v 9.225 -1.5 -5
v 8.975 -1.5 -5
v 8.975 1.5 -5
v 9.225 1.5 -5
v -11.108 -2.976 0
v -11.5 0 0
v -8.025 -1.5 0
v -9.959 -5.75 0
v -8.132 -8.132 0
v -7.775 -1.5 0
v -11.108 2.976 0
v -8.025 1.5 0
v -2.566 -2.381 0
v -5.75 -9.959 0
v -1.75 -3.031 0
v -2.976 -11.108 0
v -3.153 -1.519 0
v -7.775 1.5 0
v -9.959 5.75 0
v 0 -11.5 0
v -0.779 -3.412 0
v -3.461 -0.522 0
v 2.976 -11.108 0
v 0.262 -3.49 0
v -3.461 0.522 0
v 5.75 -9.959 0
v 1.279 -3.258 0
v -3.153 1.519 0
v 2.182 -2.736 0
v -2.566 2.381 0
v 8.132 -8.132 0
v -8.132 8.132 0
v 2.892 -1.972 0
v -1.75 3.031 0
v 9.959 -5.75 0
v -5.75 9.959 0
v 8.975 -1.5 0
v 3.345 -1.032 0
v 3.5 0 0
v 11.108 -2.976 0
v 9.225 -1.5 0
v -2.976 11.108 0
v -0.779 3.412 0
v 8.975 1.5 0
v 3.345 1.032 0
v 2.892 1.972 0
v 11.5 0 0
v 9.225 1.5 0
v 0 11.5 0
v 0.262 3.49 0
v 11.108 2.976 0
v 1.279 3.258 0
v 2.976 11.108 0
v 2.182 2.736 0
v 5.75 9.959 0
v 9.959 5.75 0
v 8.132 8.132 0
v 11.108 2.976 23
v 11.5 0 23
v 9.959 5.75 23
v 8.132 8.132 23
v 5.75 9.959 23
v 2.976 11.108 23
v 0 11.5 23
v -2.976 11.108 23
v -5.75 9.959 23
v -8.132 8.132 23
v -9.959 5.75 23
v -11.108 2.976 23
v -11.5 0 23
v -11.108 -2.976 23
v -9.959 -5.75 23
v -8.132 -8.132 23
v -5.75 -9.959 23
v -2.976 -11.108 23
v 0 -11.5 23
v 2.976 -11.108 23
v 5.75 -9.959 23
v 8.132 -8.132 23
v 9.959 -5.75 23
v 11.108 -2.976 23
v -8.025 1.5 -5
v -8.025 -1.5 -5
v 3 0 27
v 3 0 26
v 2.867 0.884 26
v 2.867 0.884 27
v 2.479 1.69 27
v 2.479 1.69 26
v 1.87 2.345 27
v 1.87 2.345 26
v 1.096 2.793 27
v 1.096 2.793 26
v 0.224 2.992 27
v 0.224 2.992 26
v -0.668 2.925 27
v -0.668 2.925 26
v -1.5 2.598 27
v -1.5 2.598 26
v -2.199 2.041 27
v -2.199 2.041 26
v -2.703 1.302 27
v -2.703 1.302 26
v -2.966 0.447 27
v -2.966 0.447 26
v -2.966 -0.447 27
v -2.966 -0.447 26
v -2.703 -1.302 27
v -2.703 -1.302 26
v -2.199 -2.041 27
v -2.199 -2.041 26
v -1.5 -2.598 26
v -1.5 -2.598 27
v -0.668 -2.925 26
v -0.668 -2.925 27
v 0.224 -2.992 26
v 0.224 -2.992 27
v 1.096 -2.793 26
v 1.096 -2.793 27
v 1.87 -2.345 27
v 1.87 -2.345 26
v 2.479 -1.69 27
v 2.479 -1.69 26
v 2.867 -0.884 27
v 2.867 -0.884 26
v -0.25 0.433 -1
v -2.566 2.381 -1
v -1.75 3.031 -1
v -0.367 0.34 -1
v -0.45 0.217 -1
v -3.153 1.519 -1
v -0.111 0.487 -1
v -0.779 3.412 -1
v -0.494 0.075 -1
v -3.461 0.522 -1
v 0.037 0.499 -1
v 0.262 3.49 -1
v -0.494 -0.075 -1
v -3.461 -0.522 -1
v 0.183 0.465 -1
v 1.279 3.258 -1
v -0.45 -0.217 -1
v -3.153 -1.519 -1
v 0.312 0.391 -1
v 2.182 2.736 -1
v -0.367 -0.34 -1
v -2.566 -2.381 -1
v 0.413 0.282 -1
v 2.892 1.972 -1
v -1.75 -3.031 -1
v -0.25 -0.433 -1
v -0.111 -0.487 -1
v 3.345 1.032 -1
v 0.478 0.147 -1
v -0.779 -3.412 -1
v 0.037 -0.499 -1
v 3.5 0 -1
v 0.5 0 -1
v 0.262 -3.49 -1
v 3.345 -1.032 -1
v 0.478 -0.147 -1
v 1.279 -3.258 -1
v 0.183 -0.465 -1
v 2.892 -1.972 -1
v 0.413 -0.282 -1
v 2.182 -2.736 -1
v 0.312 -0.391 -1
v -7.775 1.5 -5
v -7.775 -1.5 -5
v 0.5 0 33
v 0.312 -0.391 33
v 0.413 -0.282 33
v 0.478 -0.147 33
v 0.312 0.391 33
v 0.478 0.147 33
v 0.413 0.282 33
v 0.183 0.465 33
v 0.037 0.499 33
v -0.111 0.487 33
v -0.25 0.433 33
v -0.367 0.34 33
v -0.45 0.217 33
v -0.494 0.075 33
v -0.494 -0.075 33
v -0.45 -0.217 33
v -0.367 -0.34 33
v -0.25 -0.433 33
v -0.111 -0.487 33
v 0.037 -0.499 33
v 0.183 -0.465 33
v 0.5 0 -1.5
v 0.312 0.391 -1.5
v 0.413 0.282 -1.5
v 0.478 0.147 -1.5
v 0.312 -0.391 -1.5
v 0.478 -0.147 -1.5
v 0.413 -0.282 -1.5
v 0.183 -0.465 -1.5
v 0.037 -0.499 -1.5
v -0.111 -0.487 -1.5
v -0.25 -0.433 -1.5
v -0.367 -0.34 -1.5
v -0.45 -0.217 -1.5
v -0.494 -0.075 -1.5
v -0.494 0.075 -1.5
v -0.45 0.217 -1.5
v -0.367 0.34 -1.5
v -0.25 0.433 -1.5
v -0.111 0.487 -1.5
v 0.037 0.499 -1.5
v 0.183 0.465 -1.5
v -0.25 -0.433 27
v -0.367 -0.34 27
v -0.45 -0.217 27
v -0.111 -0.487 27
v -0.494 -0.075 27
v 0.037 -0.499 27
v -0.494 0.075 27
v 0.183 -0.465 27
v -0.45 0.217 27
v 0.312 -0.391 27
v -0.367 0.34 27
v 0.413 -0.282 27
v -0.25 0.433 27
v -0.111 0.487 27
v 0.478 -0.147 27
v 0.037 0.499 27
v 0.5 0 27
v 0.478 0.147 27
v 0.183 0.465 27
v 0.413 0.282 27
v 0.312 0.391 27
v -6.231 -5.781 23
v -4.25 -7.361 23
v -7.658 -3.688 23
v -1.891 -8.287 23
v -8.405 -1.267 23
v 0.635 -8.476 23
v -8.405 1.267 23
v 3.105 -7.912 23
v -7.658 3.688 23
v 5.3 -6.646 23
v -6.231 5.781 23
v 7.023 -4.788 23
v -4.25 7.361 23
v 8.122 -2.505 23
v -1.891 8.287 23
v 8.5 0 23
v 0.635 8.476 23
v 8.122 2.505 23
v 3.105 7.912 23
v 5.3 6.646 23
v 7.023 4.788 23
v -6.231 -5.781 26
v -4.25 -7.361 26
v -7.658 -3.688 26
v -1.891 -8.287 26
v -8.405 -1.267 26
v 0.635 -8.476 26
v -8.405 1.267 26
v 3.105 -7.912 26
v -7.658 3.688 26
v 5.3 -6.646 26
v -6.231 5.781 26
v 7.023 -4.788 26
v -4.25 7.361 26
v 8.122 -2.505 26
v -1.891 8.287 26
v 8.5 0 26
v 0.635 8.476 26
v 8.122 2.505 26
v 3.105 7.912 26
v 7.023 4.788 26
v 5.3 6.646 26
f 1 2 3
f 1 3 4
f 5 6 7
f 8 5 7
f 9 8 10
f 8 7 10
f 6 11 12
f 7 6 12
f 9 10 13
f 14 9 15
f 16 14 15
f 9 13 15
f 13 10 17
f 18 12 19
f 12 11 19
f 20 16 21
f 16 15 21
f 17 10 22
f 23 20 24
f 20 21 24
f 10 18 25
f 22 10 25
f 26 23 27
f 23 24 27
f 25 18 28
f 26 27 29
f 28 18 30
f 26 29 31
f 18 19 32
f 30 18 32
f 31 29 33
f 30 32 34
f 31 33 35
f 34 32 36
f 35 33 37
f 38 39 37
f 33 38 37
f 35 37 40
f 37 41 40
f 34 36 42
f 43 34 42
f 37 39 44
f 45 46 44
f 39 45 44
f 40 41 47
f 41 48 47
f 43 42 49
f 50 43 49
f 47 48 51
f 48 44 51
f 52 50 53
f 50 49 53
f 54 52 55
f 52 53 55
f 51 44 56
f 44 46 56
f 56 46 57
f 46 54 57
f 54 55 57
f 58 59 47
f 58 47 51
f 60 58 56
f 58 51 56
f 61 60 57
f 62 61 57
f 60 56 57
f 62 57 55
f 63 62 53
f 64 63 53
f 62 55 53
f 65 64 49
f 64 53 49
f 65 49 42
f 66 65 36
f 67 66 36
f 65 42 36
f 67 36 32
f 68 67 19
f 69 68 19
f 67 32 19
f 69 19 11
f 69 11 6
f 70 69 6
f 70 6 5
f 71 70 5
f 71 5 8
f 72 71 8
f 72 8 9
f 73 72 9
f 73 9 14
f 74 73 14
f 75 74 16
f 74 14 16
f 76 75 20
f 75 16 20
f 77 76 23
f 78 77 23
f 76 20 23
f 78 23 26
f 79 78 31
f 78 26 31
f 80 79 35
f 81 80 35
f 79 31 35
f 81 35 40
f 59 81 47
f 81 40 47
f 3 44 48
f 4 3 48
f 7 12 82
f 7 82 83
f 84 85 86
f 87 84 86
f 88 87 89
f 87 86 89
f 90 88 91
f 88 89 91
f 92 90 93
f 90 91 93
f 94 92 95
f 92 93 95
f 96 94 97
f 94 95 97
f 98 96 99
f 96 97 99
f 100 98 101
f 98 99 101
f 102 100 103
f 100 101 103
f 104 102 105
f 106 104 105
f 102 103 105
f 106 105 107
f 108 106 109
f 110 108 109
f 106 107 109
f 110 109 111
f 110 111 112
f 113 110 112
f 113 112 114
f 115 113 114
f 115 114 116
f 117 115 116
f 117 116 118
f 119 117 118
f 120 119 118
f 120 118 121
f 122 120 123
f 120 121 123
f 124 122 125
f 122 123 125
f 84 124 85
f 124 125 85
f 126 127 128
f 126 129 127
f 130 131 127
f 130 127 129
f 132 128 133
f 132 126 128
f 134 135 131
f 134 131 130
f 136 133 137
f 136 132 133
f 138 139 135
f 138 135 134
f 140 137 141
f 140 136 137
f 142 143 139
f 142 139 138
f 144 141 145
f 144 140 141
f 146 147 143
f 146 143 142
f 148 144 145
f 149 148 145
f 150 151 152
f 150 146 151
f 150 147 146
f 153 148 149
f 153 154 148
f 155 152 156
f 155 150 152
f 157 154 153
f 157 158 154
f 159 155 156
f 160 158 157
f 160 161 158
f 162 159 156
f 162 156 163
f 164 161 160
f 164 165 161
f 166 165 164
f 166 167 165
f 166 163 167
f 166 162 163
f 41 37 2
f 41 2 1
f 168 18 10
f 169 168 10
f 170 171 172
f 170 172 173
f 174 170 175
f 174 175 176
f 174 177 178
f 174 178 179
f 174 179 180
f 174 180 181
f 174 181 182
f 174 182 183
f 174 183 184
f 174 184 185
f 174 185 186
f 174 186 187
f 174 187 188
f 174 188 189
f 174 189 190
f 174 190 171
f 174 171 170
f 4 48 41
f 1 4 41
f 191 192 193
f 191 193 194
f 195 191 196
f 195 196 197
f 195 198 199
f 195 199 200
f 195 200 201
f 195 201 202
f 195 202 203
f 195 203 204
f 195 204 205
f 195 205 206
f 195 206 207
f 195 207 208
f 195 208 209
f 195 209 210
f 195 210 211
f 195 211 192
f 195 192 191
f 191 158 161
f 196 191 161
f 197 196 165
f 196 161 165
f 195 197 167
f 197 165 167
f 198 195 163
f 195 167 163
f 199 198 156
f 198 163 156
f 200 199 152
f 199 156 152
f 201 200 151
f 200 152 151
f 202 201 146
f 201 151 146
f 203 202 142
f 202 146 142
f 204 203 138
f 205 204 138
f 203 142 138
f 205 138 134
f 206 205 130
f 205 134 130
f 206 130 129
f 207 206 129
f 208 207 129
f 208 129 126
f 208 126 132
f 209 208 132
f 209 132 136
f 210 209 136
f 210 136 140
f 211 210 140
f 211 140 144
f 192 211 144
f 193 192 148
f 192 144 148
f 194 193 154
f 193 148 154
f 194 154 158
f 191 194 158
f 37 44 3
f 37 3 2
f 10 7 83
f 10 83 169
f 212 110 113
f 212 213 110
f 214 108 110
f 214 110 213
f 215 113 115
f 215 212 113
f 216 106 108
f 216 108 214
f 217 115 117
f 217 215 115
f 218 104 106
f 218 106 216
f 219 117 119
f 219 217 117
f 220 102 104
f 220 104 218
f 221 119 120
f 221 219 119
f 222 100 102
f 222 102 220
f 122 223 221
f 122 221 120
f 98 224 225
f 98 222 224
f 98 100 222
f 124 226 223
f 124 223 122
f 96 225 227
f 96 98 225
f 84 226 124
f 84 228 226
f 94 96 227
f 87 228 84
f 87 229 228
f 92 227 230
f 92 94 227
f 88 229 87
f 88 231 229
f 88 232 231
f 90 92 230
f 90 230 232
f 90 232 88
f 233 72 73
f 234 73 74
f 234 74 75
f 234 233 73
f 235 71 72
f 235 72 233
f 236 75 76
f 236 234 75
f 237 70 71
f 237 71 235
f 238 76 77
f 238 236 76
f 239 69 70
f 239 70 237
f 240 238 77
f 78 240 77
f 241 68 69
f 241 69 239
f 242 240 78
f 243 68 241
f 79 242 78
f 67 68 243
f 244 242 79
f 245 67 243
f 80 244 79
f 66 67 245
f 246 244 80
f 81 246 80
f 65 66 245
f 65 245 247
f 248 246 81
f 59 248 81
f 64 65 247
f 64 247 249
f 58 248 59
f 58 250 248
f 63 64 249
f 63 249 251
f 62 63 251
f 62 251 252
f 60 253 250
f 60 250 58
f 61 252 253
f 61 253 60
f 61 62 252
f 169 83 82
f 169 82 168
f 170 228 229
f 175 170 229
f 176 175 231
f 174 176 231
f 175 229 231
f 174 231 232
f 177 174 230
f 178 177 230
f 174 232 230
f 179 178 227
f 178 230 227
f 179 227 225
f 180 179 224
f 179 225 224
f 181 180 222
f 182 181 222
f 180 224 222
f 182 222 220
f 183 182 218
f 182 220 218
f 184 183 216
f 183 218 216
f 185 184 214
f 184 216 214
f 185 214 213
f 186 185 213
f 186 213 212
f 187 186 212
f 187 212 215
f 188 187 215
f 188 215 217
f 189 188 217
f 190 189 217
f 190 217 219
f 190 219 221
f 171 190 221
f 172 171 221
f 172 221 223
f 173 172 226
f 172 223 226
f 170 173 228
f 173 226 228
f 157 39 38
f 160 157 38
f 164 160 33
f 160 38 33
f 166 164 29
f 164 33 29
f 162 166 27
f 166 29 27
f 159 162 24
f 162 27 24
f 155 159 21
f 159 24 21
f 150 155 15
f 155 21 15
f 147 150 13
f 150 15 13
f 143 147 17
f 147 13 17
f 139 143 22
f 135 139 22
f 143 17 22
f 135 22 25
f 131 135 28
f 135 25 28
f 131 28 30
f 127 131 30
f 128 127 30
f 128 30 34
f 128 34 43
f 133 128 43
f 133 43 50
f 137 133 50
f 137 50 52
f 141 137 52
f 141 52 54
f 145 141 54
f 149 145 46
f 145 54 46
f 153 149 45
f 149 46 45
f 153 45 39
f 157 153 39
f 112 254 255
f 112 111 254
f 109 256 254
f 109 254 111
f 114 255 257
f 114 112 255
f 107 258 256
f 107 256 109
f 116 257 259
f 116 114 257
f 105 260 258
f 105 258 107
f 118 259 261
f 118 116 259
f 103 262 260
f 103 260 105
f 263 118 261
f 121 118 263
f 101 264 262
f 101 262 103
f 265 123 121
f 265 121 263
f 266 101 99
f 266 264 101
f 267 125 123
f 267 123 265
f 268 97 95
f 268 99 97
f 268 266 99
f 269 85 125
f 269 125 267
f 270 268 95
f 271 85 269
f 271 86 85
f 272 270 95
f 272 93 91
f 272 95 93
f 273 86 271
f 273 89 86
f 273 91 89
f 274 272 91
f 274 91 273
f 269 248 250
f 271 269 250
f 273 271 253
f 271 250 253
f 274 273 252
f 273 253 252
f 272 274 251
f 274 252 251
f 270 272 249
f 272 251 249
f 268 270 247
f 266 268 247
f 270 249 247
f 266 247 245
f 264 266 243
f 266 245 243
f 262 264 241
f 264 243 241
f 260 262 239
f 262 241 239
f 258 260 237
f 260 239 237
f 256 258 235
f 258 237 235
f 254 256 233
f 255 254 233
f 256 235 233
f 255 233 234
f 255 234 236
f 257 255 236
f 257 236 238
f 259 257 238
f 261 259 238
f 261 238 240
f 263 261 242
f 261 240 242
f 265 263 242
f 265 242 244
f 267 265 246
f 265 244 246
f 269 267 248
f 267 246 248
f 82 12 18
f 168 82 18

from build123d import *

# Parameters (mm, degrees)
F0_R      = 11.5
F1_DEPTH  = 23
F2_R      = 8.5
F3_DEPTH  = 3
F4_R      = 3
F5_DEPTH  = 1
F6_R      = 0.5
F7_DEPTH  = 6
F8_R      = 3.5
F9_DEPTH  = 1
F10_R     = 0.5
F11_DEPTH = 0.5
F12_W     = 0.25
F12_H     = 3
F13_DEPTH = 5


with BuildPart() as f1:
    # F0 (on Top) → F1 (new body)
    with BuildSketch(Plane.XY):
        Circle(F0_R)
    extrude(amount=F1_DEPTH)

    # F2 (on face) → F3 (join)
    with BuildSketch(Plane.XY.offset(23)):
        Circle(F2_R)
    extrude(amount=F3_DEPTH)

    # F4 (on face) → F5 (join)
    with BuildSketch(Plane.XY.offset(26)):
        Circle(F4_R)
    extrude(amount=F5_DEPTH)

    # F6 (on face) → F7 (join)
    with BuildSketch(Plane.XY.offset(27)):
        Circle(F6_R)
    extrude(amount=F7_DEPTH)

    # F8 (on face) → F9 (join)
    with BuildSketch(Plane(origin=(0, 0, 0), x_dir=(1, 0, 0), z_dir=(0, 0, -1))):
        Circle(F8_R)
    extrude(amount=F9_DEPTH)

    # F10 (on face) → F11 (join)
    with BuildSketch(Plane(origin=(0, 0, -1), x_dir=(1, 0, 0), z_dir=(0, 0, -1))):
        Circle(F10_R)
    extrude(amount=F11_DEPTH)

    # F12 (on face) → F13 (join)
    with BuildSketch(Plane(origin=(0, 0, 0), x_dir=(1, 0, 0), z_dir=(0, 0, -1))):
        with Locations((-7.9, 0)):
            Rectangle(F12_W, F12_H)
        with Locations((9.1, 0)):
            Rectangle(F12_W, F12_H)
    extrude(amount=F13_DEPTH)


solid = f1.part
